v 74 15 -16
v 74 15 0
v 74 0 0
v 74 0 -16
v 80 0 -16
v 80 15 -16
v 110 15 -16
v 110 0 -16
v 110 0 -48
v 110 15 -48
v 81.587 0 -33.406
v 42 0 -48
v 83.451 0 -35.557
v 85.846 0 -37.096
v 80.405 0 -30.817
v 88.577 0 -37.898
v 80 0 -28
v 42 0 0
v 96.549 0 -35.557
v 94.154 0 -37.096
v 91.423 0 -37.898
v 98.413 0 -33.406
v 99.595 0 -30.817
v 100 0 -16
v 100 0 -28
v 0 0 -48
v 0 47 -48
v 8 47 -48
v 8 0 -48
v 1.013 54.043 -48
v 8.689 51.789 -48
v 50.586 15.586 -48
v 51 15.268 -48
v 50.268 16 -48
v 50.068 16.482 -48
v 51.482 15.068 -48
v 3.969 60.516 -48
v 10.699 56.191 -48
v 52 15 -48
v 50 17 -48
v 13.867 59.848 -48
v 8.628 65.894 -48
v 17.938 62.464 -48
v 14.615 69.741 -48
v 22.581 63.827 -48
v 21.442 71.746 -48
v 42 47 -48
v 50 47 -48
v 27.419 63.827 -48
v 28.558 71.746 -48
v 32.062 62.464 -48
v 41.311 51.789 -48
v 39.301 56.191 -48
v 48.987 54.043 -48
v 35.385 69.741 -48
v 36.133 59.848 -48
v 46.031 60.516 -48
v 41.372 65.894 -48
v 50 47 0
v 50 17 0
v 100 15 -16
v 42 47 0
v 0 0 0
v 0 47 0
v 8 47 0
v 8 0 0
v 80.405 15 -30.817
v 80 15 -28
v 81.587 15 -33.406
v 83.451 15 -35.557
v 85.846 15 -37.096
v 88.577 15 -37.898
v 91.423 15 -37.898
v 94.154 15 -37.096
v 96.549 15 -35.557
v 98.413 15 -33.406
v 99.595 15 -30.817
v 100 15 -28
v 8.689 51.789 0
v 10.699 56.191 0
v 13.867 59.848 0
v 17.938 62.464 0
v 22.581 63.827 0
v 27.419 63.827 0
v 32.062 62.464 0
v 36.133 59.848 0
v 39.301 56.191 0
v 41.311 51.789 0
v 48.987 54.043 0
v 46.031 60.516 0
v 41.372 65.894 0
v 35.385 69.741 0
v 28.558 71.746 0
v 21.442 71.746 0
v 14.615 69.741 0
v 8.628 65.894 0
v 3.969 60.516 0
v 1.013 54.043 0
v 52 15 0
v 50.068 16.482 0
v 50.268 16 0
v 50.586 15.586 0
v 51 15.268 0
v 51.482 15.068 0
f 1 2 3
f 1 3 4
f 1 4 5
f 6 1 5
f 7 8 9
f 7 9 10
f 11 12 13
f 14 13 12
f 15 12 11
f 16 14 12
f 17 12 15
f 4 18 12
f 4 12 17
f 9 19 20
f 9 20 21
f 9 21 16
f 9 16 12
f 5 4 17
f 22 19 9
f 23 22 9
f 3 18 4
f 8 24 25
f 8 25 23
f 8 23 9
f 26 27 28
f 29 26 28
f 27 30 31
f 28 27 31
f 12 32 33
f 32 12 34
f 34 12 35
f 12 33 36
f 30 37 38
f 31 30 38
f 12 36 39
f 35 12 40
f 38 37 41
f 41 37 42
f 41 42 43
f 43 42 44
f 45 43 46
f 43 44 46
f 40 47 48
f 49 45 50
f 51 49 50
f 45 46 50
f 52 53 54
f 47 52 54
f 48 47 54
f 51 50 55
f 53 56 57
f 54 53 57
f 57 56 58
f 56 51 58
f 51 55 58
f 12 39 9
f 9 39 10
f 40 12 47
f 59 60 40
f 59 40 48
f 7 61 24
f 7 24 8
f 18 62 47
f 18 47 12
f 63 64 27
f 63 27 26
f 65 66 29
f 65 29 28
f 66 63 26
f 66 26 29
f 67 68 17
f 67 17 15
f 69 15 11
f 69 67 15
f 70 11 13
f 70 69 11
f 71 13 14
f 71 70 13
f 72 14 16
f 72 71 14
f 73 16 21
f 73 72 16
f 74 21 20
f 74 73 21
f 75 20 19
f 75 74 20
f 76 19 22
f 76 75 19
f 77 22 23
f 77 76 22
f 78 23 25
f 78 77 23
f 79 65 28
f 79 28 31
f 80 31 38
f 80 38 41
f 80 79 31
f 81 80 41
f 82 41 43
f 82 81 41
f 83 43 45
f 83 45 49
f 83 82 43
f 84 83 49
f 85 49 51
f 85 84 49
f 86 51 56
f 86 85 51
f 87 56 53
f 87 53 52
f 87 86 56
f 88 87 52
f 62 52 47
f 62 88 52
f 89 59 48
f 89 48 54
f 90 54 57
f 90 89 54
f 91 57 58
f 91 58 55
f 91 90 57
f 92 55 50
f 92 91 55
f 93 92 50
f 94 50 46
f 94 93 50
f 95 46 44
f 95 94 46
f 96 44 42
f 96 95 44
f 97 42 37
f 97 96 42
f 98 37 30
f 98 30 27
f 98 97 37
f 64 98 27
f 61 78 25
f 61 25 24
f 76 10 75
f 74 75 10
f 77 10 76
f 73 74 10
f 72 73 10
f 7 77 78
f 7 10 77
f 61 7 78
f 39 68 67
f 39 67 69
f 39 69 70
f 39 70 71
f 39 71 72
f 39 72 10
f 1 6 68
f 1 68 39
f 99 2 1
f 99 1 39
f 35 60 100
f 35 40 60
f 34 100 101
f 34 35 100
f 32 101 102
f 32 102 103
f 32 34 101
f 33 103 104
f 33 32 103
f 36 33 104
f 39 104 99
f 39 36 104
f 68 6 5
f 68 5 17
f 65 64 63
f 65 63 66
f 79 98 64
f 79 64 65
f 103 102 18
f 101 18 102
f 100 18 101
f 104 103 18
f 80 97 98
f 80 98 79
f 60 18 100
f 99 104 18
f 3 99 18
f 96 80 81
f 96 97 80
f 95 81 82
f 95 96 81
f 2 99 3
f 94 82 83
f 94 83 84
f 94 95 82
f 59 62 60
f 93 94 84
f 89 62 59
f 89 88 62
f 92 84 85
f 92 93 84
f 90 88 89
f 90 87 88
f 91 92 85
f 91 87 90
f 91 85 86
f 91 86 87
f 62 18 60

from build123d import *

# Parameters (mm, degrees)
EXTRUDE_1_DEPTH     = 48
CUT_EXTRUDE_1_DEPTH = 48
FILLET_1_R          = 2


with BuildPart() as part:
    # 草圖1 → 填料-伸長1 (new body)
    with BuildSketch(Plane.XY):
        with BuildLine():
            Line((0, 0), (8, 0))
            Line((8, 0), (8, 47))
            ThreePointArc((8, 47), (25, 64), (42, 47))
            Line((42, 47), (42, 0))
            Line((42, 0), (110, 0))
            Line((110, 0), (110, 15))
            Line((110, 15), (50, 15))
            Line((50, 15), (50, 47))
            ThreePointArc((50, 47), (25, 72), (0, 47))
            Line((0, 47), (0, 0))
        make_face()
    extrude(amount=-EXTRUDE_1_DEPTH)

    # 草圖2 → 除料-伸長1 (cut)
    with BuildSketch(Plane(origin=(0, 15, 0), x_dir=(1, 0, 0), z_dir=(0, 1, 0))):
        with BuildLine():
            Line((74, 0), (74, 16))
            Line((74, 16), (80, 16))
            Line((80, 16), (80, 28))
            ThreePointArc((80, 28), (90, 38), (100, 28))
            Line((100, 28), (100, 16))
            Line((100, 16), (110, 16))
            Line((110, 16), (110, 0))
            Line((110, 0), (74, 0))
        make_face()
    extrude(amount=-CUT_EXTRUDE_1_DEPTH, mode=Mode.SUBTRACT)

    # 圓角1
    fillet_1_edges = [part.edges().sort_by_distance(p)[0] for p in [
        (50, 15, -24),
    ]]
    fillet(fillet_1_edges, radius=FILLET_1_R)


solid = part.part
